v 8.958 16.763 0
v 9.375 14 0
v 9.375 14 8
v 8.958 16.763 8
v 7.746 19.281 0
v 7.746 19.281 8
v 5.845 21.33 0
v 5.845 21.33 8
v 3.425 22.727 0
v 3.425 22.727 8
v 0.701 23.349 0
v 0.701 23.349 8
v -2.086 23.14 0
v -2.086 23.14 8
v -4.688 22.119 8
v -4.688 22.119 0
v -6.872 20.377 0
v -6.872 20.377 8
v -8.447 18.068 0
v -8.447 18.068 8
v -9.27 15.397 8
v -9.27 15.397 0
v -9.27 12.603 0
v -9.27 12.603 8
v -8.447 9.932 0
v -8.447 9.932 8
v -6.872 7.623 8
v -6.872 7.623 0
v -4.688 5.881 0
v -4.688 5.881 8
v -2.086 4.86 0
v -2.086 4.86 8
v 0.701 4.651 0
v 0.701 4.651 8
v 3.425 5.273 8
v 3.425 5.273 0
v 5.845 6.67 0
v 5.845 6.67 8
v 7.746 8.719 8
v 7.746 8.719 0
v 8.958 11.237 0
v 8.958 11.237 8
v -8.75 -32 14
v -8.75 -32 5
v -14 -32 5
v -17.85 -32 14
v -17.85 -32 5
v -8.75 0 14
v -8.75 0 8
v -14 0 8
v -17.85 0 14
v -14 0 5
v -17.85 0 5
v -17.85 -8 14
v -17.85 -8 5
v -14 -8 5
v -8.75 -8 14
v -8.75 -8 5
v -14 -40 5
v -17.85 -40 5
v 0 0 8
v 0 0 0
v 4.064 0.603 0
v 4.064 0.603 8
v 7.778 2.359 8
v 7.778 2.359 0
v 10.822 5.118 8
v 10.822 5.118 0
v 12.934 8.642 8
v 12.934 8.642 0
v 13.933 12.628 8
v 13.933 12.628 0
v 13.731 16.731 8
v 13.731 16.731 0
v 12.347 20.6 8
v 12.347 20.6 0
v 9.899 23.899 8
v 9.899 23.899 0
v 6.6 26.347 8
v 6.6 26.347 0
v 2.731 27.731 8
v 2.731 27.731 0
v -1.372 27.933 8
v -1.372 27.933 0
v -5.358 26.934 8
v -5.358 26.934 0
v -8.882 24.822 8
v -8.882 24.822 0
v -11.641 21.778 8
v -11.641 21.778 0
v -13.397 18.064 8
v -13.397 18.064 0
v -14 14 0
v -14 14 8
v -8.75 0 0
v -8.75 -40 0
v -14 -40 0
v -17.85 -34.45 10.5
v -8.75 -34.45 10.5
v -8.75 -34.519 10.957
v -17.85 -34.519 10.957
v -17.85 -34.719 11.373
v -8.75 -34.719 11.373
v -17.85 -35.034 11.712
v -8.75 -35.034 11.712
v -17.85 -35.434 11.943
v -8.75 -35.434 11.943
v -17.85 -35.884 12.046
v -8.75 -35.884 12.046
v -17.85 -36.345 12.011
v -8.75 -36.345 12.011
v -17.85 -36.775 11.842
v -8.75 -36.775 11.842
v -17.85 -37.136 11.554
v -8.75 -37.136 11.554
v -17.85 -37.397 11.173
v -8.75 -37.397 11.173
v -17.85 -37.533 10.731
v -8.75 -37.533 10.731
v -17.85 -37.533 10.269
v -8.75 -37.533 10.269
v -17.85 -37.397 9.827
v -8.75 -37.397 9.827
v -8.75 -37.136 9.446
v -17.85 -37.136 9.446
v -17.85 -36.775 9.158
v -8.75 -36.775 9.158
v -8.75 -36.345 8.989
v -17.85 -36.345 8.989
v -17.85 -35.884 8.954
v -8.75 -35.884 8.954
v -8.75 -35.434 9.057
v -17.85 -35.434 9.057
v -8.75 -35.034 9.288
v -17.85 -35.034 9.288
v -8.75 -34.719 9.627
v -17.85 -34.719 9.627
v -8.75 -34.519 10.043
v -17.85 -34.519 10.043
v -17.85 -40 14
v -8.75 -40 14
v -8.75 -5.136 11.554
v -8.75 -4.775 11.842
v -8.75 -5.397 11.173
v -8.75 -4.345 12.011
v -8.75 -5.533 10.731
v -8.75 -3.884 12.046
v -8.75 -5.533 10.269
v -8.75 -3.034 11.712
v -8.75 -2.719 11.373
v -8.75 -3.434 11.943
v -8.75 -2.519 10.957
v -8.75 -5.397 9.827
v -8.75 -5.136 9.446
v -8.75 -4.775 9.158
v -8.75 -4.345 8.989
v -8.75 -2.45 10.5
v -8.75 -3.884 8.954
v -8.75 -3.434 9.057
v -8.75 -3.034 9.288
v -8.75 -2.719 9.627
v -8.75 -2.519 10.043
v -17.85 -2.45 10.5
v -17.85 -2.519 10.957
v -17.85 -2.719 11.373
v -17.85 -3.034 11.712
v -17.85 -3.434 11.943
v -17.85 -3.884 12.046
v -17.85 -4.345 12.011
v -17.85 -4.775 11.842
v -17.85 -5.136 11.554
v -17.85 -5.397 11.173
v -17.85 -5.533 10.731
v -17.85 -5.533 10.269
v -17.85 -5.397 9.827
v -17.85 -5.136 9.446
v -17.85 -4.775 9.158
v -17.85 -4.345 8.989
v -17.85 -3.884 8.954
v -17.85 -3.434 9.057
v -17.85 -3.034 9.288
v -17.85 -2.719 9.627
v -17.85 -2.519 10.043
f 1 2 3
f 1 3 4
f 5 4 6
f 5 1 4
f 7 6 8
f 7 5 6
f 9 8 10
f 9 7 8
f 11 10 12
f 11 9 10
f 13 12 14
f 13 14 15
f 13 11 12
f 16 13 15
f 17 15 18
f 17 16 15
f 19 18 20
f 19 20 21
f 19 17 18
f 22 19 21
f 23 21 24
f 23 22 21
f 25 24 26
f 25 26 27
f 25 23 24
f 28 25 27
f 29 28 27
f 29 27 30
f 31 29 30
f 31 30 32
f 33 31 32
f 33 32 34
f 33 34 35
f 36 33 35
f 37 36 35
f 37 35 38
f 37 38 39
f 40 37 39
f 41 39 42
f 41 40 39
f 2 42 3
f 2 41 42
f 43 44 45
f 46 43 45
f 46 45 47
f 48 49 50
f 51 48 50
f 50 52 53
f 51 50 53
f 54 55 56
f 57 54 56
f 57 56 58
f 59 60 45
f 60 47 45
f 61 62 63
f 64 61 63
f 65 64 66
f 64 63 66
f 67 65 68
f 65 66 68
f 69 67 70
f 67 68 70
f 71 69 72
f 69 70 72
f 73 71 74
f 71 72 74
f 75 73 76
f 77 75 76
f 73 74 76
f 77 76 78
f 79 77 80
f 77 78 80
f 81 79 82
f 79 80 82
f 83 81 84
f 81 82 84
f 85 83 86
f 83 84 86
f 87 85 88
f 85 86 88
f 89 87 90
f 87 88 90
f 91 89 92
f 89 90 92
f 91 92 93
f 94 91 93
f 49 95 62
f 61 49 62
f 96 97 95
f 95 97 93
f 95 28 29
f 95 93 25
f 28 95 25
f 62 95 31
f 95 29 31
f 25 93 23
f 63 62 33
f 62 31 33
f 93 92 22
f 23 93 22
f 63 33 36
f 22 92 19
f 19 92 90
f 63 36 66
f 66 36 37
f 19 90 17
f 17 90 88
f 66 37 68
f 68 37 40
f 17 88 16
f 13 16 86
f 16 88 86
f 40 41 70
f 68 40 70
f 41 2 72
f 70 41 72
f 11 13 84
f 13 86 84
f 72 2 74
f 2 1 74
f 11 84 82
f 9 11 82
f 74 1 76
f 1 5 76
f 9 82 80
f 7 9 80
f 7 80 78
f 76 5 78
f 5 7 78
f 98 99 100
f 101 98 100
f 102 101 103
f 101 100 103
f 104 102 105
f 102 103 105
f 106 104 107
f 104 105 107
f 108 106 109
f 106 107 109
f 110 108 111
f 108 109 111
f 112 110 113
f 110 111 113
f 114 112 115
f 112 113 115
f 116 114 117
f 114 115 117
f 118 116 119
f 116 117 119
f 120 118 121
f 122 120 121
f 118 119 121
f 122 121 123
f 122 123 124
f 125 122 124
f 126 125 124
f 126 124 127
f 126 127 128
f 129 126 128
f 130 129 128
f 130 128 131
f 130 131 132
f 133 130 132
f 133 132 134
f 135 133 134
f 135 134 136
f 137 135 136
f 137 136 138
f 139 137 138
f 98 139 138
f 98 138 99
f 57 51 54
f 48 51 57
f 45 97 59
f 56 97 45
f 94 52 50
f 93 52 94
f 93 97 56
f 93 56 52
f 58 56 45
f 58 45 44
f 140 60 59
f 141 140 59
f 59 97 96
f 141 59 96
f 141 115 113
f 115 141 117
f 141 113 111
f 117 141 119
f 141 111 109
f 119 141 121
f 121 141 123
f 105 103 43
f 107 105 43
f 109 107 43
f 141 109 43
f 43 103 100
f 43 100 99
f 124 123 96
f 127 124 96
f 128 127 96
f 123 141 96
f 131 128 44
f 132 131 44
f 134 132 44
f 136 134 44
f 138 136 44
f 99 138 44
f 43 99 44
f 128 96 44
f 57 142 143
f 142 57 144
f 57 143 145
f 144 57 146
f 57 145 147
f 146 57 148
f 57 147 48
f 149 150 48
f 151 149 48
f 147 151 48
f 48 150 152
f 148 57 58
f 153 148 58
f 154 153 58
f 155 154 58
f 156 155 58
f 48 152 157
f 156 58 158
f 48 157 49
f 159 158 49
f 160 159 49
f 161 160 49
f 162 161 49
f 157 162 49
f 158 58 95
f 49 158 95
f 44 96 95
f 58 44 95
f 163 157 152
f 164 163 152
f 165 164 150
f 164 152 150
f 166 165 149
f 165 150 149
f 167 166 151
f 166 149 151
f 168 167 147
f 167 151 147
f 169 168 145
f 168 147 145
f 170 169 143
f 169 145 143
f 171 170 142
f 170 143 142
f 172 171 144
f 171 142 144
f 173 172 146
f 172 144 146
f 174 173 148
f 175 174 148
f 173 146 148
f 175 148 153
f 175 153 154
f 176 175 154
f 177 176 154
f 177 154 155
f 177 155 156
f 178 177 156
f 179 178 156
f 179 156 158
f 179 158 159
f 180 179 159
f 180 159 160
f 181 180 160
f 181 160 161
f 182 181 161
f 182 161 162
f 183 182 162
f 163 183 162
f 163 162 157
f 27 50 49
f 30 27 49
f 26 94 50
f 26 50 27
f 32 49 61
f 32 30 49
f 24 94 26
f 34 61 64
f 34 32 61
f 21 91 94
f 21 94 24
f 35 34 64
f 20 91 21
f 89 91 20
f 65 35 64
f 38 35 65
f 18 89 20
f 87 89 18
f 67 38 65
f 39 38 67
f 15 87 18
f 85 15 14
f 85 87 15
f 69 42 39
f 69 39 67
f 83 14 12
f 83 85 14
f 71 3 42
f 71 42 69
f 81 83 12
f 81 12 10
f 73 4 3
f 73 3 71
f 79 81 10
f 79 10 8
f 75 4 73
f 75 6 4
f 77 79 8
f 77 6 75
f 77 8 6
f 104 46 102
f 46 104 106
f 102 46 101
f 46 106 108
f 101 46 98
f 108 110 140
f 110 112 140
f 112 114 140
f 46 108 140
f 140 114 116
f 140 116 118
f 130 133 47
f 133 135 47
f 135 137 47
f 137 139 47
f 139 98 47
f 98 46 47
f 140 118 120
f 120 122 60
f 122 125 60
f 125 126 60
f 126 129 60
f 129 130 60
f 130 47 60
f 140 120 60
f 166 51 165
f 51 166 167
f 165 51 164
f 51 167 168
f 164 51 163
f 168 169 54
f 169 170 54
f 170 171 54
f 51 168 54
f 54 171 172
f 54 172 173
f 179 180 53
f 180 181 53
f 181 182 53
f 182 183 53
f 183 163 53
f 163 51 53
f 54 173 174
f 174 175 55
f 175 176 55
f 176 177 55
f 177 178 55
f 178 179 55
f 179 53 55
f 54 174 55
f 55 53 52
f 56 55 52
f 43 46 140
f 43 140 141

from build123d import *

# Parameters (mm, degrees)
F0_R     = 9.375
F1_DEPTH = 8
F2_W     = 5.25
F2_H     = 40
F3_DEPTH = 5
F5_DEPTH = 9
F7_D     = 3.1


with BuildPart() as f1:
    # F0 (on Top) → F1 (new body)
    with BuildSketch(Plane.XY):
        with BuildLine():
            Line((-14, 0), (0, 0))
            ThreePointArc((0, 0), (9.899495, 23.899495), (-14, 14))
            Line((-14, 14), (-14, 0))
        make_face()
        with Locations((0, 14)):
            Circle(F0_R, mode=Mode.SUBTRACT)
    extrude(amount=F1_DEPTH)

    # F2 (on Top) → F3 (join)
    with BuildSketch(Plane.XY):
        with Locations((-11.375, -20)):
            Rectangle(F2_W, F2_H)
    extrude(amount=F3_DEPTH)

    # F4 (on face) → F5 (join)
    with BuildSketch(Plane.XY.offset(5)):
        Polygon((-8.75, -40), (-8.75, -32), (-17.85, -32), (-17.85, -40), (-14, -40), align=None)
        Polygon((-8.75, 0), (-14, 0), (-17.85, 0), (-17.85, -8), (-8.75, -8), align=None)
    extrude(amount=F5_DEPTH)

    # F7 (through all)
    with Locations(Plane(origin=(-17.85, 0, 0), x_dir=(0, -1, 0), z_dir=(-1, 0, 0))):
        with Locations((4, 10.5), (36, 10.5)):
            Hole(F7_D / 2)


solid = f1.part
